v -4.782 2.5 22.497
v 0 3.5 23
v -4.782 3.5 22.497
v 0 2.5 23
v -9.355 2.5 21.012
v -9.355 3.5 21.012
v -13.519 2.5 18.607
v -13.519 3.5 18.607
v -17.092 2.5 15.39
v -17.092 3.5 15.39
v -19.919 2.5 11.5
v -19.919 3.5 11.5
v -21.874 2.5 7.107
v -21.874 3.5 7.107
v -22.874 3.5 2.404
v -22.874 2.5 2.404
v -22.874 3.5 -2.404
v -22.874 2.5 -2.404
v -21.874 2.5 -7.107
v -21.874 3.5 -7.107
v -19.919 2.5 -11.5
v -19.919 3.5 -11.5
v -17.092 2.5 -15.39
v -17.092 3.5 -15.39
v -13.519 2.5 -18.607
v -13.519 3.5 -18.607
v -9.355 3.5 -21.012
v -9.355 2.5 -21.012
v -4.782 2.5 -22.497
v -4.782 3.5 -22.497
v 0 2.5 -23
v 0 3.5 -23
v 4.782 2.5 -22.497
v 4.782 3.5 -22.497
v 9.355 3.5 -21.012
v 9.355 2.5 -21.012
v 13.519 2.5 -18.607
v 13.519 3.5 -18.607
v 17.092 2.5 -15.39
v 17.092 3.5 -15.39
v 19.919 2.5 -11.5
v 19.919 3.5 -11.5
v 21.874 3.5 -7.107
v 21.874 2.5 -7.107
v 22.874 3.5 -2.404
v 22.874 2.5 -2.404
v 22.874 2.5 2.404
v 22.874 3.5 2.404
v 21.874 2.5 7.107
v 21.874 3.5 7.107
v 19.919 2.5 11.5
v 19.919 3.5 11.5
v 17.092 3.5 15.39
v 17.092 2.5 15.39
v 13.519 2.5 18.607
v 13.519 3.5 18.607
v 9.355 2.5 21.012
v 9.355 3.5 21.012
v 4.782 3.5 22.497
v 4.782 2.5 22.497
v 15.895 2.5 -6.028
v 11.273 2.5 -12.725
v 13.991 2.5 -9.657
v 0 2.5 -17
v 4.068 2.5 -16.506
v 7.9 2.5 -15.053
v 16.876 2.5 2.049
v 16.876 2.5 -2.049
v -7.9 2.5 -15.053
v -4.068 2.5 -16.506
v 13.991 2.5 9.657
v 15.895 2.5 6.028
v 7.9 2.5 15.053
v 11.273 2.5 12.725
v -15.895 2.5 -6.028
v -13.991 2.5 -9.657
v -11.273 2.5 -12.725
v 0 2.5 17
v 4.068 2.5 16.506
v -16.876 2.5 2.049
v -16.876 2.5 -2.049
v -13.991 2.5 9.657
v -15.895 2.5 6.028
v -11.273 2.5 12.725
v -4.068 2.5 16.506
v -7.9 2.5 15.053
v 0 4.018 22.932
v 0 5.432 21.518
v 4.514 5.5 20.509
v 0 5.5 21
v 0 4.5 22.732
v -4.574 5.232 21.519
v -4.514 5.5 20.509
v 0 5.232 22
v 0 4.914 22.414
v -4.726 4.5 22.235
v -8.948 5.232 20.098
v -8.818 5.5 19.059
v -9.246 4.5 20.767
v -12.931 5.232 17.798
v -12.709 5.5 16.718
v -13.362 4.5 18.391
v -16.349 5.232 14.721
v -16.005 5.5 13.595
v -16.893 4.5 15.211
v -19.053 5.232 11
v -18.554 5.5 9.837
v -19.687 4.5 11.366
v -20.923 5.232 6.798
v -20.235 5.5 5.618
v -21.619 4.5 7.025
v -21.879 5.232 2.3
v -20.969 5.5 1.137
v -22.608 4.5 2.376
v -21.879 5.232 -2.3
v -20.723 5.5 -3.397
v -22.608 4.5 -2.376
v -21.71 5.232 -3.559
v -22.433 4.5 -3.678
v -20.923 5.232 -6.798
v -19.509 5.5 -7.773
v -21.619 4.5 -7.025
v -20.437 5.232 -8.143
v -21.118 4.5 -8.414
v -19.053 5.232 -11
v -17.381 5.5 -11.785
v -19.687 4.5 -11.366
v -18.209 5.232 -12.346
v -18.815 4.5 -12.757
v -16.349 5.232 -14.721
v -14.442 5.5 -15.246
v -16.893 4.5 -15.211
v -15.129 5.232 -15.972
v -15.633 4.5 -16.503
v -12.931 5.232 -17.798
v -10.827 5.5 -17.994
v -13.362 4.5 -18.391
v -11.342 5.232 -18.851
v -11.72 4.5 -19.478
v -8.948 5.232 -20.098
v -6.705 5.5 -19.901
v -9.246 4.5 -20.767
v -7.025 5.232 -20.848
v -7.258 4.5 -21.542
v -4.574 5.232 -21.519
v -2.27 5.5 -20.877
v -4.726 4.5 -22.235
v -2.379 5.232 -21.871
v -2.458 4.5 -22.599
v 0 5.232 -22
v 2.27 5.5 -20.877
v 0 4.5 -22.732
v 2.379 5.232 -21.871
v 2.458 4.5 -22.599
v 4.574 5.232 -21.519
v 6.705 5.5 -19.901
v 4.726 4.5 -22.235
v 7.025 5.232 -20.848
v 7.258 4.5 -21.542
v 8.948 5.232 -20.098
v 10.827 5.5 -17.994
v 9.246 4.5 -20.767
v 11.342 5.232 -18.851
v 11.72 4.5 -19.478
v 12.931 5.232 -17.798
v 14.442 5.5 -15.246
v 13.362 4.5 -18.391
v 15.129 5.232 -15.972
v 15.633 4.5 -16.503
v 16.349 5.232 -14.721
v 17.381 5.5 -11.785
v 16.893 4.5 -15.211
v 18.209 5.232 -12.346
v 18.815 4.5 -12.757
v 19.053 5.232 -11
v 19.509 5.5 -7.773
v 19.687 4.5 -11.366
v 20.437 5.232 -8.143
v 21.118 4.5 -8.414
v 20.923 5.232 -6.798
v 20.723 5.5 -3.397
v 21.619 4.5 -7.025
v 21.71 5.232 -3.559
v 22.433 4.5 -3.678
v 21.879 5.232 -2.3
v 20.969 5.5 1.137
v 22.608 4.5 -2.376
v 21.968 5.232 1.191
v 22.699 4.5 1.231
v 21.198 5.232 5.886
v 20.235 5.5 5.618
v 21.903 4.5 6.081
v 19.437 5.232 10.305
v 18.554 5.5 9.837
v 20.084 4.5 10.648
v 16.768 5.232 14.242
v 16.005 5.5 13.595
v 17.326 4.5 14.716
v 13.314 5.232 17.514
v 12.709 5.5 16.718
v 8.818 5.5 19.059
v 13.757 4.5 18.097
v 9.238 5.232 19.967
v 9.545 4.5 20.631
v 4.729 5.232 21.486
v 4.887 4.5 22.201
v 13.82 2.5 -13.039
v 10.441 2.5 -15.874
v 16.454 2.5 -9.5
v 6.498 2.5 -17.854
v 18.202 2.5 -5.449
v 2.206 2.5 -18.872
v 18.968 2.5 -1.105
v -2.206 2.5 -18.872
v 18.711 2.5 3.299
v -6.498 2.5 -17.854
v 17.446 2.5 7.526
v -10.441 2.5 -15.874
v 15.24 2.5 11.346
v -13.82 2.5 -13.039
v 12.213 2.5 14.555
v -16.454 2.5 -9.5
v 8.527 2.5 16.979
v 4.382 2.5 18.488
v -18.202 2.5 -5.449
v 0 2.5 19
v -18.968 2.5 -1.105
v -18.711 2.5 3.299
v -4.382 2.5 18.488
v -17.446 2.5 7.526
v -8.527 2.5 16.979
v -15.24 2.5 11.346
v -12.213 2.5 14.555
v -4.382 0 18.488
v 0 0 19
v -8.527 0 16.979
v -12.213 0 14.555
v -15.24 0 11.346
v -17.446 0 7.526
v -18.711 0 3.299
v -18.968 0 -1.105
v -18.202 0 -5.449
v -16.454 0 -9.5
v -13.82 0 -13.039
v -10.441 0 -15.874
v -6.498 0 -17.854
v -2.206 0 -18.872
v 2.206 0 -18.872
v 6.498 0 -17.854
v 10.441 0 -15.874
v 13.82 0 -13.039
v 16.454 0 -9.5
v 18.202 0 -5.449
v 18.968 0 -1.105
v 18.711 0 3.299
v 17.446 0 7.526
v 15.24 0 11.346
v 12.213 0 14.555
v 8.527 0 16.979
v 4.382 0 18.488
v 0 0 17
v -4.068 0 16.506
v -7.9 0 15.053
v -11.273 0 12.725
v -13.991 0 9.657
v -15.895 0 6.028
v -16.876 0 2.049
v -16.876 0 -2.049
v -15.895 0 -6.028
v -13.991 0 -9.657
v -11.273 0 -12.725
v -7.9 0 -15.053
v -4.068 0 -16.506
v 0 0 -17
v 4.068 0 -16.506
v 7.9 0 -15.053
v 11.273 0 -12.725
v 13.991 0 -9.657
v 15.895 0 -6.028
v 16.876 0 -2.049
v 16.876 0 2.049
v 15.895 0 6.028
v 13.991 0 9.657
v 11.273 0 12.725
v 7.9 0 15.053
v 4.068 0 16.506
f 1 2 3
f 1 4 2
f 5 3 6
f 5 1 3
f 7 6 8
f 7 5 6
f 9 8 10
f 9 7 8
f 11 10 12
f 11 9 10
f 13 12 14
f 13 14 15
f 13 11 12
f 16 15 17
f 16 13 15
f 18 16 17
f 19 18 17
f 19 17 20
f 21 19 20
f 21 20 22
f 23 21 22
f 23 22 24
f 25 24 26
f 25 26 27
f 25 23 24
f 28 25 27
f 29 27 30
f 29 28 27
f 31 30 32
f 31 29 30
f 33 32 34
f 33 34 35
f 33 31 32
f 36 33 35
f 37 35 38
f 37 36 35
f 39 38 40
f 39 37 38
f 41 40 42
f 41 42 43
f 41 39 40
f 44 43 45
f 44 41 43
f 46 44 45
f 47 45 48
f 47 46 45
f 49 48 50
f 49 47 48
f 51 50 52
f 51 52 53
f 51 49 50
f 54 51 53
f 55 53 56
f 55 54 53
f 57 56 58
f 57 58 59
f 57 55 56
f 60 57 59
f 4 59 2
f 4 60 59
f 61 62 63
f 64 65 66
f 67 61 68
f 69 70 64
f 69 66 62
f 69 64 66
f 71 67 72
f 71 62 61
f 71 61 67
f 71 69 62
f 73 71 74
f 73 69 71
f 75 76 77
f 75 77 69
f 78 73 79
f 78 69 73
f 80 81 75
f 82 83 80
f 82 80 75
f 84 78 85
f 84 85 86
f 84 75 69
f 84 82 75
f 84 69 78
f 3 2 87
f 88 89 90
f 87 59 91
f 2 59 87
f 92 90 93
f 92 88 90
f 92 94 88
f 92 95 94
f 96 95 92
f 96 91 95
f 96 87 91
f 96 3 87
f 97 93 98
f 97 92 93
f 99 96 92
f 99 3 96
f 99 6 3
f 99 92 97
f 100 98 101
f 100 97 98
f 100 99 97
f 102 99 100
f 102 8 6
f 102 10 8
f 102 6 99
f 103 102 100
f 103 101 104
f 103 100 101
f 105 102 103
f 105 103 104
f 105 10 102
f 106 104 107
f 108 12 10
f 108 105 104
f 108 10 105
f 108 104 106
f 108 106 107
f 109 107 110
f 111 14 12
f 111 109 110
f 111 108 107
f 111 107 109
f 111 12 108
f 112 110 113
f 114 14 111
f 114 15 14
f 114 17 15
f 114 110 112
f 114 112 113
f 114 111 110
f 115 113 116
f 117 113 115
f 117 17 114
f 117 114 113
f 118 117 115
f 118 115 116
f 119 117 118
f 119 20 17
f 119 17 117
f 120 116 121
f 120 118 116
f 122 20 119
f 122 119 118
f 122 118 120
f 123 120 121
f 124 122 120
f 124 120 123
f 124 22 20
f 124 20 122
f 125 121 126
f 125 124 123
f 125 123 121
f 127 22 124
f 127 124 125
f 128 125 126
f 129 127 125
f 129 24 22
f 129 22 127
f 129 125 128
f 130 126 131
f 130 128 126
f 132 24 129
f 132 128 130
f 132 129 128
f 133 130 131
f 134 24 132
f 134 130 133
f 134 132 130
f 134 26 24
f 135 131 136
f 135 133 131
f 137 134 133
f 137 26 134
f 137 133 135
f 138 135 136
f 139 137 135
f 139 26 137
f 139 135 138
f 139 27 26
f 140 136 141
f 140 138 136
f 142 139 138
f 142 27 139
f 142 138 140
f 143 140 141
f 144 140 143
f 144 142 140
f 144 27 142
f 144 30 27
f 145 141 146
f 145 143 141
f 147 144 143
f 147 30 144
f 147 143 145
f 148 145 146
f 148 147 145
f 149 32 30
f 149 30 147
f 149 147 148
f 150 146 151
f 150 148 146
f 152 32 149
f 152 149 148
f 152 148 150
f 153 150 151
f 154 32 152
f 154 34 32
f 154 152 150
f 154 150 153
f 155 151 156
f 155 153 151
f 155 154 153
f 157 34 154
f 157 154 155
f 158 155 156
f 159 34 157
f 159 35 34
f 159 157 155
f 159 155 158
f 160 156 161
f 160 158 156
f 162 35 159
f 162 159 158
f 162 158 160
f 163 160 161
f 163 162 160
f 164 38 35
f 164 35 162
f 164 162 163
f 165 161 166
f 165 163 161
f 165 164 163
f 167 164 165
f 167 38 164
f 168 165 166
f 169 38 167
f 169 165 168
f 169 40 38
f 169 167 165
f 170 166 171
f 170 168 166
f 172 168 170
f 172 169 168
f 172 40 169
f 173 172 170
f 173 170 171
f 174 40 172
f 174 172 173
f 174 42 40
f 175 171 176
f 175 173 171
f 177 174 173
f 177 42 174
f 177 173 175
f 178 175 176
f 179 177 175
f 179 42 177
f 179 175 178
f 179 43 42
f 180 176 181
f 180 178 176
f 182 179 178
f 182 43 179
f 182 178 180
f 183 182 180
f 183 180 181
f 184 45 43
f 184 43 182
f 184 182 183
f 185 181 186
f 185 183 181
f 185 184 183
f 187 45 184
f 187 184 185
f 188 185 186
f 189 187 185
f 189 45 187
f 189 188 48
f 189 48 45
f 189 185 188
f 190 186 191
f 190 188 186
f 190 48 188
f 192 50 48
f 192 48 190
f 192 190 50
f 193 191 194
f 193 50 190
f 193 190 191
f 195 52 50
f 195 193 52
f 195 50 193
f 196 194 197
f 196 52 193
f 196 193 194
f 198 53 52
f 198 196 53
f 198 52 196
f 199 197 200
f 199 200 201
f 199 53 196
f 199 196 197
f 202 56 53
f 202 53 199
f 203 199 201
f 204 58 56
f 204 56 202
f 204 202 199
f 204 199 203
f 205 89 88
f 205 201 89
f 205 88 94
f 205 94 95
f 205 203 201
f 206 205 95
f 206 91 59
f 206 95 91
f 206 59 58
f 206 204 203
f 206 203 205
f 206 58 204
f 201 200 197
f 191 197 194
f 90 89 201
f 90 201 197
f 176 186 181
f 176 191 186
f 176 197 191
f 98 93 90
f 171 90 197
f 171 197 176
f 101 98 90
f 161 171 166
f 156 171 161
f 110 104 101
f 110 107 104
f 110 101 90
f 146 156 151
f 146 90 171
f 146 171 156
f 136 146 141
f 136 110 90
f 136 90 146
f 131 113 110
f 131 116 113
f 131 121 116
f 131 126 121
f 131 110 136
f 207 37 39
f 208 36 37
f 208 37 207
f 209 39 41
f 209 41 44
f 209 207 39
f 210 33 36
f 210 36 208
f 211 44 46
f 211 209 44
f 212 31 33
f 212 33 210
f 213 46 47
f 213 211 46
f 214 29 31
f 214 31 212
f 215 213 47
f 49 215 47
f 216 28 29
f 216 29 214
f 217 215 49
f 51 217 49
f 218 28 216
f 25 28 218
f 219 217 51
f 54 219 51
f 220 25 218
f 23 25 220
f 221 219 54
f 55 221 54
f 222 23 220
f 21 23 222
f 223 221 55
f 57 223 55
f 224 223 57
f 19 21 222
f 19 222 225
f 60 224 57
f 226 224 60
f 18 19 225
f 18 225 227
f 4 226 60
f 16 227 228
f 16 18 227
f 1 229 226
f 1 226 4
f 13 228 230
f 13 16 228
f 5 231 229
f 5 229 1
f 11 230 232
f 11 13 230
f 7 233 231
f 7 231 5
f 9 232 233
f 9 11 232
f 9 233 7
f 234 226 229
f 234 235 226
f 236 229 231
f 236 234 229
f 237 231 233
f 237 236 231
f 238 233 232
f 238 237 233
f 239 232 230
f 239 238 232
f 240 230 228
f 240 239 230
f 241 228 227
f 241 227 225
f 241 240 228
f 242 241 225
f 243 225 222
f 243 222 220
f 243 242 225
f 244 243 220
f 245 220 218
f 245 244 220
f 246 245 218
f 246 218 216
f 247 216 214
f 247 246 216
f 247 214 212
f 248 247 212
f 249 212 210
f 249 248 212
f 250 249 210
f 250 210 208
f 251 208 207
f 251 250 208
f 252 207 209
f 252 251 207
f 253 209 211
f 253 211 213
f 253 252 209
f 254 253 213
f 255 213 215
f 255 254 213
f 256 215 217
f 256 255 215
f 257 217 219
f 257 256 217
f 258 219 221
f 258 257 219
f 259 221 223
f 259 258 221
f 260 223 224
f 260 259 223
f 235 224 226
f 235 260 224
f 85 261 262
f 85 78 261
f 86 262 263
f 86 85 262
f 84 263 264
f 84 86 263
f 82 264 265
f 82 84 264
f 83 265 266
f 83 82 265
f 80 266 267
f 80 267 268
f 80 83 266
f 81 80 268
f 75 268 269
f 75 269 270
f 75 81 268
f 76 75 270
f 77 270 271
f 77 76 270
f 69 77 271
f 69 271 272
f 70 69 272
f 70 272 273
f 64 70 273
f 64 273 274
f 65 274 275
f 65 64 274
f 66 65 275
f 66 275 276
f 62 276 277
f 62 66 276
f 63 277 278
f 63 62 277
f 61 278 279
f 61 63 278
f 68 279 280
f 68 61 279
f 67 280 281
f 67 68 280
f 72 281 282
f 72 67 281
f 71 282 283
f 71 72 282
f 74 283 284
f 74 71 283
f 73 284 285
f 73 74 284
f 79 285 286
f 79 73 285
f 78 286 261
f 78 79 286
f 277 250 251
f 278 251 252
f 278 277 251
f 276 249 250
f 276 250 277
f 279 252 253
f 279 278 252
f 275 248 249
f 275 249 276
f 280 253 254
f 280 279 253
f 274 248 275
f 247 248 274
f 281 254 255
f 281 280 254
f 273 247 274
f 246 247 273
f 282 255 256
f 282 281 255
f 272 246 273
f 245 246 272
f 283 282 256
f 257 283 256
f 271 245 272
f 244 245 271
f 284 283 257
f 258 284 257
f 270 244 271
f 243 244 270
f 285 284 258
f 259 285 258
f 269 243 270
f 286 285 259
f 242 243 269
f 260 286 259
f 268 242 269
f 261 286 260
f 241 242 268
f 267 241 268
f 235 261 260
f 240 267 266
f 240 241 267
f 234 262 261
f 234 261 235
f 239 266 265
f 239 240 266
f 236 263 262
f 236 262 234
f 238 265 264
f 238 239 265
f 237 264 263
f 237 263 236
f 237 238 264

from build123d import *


with BuildPart() as part:
    # Esquisse2 → Révolution1 (revolve)
    with BuildSketch(Plane.XY, mode=Mode.PRIVATE) as r_volution1_sk:
        with BuildLine():
            Line((0, 5.5), (21, 5.5))
            ThreePointArc((21, 5.5), (22.414213562, 4.914213562), (23, 3.5))
            Line((23, 3.5), (23, 2.5))
            Line((23, 2.5), (19, 2.5))
            Line((19, 2.5), (19, 0))
            Line((19, 0), (17, 0))
            Line((17, 0), (17, 2.5))
            Line((17, 2.5), (0, 2.5))
            Line((0, 2.5), (0, 5.5))
        make_face()
    revolve(r_volution1_sk.sketch.rotate(Axis((0, 31.915652174, 0), (0, -1, 0)), 90), axis=Axis((0, 31.915652174, 0), (0, -1, 0)))


solid = part.part
